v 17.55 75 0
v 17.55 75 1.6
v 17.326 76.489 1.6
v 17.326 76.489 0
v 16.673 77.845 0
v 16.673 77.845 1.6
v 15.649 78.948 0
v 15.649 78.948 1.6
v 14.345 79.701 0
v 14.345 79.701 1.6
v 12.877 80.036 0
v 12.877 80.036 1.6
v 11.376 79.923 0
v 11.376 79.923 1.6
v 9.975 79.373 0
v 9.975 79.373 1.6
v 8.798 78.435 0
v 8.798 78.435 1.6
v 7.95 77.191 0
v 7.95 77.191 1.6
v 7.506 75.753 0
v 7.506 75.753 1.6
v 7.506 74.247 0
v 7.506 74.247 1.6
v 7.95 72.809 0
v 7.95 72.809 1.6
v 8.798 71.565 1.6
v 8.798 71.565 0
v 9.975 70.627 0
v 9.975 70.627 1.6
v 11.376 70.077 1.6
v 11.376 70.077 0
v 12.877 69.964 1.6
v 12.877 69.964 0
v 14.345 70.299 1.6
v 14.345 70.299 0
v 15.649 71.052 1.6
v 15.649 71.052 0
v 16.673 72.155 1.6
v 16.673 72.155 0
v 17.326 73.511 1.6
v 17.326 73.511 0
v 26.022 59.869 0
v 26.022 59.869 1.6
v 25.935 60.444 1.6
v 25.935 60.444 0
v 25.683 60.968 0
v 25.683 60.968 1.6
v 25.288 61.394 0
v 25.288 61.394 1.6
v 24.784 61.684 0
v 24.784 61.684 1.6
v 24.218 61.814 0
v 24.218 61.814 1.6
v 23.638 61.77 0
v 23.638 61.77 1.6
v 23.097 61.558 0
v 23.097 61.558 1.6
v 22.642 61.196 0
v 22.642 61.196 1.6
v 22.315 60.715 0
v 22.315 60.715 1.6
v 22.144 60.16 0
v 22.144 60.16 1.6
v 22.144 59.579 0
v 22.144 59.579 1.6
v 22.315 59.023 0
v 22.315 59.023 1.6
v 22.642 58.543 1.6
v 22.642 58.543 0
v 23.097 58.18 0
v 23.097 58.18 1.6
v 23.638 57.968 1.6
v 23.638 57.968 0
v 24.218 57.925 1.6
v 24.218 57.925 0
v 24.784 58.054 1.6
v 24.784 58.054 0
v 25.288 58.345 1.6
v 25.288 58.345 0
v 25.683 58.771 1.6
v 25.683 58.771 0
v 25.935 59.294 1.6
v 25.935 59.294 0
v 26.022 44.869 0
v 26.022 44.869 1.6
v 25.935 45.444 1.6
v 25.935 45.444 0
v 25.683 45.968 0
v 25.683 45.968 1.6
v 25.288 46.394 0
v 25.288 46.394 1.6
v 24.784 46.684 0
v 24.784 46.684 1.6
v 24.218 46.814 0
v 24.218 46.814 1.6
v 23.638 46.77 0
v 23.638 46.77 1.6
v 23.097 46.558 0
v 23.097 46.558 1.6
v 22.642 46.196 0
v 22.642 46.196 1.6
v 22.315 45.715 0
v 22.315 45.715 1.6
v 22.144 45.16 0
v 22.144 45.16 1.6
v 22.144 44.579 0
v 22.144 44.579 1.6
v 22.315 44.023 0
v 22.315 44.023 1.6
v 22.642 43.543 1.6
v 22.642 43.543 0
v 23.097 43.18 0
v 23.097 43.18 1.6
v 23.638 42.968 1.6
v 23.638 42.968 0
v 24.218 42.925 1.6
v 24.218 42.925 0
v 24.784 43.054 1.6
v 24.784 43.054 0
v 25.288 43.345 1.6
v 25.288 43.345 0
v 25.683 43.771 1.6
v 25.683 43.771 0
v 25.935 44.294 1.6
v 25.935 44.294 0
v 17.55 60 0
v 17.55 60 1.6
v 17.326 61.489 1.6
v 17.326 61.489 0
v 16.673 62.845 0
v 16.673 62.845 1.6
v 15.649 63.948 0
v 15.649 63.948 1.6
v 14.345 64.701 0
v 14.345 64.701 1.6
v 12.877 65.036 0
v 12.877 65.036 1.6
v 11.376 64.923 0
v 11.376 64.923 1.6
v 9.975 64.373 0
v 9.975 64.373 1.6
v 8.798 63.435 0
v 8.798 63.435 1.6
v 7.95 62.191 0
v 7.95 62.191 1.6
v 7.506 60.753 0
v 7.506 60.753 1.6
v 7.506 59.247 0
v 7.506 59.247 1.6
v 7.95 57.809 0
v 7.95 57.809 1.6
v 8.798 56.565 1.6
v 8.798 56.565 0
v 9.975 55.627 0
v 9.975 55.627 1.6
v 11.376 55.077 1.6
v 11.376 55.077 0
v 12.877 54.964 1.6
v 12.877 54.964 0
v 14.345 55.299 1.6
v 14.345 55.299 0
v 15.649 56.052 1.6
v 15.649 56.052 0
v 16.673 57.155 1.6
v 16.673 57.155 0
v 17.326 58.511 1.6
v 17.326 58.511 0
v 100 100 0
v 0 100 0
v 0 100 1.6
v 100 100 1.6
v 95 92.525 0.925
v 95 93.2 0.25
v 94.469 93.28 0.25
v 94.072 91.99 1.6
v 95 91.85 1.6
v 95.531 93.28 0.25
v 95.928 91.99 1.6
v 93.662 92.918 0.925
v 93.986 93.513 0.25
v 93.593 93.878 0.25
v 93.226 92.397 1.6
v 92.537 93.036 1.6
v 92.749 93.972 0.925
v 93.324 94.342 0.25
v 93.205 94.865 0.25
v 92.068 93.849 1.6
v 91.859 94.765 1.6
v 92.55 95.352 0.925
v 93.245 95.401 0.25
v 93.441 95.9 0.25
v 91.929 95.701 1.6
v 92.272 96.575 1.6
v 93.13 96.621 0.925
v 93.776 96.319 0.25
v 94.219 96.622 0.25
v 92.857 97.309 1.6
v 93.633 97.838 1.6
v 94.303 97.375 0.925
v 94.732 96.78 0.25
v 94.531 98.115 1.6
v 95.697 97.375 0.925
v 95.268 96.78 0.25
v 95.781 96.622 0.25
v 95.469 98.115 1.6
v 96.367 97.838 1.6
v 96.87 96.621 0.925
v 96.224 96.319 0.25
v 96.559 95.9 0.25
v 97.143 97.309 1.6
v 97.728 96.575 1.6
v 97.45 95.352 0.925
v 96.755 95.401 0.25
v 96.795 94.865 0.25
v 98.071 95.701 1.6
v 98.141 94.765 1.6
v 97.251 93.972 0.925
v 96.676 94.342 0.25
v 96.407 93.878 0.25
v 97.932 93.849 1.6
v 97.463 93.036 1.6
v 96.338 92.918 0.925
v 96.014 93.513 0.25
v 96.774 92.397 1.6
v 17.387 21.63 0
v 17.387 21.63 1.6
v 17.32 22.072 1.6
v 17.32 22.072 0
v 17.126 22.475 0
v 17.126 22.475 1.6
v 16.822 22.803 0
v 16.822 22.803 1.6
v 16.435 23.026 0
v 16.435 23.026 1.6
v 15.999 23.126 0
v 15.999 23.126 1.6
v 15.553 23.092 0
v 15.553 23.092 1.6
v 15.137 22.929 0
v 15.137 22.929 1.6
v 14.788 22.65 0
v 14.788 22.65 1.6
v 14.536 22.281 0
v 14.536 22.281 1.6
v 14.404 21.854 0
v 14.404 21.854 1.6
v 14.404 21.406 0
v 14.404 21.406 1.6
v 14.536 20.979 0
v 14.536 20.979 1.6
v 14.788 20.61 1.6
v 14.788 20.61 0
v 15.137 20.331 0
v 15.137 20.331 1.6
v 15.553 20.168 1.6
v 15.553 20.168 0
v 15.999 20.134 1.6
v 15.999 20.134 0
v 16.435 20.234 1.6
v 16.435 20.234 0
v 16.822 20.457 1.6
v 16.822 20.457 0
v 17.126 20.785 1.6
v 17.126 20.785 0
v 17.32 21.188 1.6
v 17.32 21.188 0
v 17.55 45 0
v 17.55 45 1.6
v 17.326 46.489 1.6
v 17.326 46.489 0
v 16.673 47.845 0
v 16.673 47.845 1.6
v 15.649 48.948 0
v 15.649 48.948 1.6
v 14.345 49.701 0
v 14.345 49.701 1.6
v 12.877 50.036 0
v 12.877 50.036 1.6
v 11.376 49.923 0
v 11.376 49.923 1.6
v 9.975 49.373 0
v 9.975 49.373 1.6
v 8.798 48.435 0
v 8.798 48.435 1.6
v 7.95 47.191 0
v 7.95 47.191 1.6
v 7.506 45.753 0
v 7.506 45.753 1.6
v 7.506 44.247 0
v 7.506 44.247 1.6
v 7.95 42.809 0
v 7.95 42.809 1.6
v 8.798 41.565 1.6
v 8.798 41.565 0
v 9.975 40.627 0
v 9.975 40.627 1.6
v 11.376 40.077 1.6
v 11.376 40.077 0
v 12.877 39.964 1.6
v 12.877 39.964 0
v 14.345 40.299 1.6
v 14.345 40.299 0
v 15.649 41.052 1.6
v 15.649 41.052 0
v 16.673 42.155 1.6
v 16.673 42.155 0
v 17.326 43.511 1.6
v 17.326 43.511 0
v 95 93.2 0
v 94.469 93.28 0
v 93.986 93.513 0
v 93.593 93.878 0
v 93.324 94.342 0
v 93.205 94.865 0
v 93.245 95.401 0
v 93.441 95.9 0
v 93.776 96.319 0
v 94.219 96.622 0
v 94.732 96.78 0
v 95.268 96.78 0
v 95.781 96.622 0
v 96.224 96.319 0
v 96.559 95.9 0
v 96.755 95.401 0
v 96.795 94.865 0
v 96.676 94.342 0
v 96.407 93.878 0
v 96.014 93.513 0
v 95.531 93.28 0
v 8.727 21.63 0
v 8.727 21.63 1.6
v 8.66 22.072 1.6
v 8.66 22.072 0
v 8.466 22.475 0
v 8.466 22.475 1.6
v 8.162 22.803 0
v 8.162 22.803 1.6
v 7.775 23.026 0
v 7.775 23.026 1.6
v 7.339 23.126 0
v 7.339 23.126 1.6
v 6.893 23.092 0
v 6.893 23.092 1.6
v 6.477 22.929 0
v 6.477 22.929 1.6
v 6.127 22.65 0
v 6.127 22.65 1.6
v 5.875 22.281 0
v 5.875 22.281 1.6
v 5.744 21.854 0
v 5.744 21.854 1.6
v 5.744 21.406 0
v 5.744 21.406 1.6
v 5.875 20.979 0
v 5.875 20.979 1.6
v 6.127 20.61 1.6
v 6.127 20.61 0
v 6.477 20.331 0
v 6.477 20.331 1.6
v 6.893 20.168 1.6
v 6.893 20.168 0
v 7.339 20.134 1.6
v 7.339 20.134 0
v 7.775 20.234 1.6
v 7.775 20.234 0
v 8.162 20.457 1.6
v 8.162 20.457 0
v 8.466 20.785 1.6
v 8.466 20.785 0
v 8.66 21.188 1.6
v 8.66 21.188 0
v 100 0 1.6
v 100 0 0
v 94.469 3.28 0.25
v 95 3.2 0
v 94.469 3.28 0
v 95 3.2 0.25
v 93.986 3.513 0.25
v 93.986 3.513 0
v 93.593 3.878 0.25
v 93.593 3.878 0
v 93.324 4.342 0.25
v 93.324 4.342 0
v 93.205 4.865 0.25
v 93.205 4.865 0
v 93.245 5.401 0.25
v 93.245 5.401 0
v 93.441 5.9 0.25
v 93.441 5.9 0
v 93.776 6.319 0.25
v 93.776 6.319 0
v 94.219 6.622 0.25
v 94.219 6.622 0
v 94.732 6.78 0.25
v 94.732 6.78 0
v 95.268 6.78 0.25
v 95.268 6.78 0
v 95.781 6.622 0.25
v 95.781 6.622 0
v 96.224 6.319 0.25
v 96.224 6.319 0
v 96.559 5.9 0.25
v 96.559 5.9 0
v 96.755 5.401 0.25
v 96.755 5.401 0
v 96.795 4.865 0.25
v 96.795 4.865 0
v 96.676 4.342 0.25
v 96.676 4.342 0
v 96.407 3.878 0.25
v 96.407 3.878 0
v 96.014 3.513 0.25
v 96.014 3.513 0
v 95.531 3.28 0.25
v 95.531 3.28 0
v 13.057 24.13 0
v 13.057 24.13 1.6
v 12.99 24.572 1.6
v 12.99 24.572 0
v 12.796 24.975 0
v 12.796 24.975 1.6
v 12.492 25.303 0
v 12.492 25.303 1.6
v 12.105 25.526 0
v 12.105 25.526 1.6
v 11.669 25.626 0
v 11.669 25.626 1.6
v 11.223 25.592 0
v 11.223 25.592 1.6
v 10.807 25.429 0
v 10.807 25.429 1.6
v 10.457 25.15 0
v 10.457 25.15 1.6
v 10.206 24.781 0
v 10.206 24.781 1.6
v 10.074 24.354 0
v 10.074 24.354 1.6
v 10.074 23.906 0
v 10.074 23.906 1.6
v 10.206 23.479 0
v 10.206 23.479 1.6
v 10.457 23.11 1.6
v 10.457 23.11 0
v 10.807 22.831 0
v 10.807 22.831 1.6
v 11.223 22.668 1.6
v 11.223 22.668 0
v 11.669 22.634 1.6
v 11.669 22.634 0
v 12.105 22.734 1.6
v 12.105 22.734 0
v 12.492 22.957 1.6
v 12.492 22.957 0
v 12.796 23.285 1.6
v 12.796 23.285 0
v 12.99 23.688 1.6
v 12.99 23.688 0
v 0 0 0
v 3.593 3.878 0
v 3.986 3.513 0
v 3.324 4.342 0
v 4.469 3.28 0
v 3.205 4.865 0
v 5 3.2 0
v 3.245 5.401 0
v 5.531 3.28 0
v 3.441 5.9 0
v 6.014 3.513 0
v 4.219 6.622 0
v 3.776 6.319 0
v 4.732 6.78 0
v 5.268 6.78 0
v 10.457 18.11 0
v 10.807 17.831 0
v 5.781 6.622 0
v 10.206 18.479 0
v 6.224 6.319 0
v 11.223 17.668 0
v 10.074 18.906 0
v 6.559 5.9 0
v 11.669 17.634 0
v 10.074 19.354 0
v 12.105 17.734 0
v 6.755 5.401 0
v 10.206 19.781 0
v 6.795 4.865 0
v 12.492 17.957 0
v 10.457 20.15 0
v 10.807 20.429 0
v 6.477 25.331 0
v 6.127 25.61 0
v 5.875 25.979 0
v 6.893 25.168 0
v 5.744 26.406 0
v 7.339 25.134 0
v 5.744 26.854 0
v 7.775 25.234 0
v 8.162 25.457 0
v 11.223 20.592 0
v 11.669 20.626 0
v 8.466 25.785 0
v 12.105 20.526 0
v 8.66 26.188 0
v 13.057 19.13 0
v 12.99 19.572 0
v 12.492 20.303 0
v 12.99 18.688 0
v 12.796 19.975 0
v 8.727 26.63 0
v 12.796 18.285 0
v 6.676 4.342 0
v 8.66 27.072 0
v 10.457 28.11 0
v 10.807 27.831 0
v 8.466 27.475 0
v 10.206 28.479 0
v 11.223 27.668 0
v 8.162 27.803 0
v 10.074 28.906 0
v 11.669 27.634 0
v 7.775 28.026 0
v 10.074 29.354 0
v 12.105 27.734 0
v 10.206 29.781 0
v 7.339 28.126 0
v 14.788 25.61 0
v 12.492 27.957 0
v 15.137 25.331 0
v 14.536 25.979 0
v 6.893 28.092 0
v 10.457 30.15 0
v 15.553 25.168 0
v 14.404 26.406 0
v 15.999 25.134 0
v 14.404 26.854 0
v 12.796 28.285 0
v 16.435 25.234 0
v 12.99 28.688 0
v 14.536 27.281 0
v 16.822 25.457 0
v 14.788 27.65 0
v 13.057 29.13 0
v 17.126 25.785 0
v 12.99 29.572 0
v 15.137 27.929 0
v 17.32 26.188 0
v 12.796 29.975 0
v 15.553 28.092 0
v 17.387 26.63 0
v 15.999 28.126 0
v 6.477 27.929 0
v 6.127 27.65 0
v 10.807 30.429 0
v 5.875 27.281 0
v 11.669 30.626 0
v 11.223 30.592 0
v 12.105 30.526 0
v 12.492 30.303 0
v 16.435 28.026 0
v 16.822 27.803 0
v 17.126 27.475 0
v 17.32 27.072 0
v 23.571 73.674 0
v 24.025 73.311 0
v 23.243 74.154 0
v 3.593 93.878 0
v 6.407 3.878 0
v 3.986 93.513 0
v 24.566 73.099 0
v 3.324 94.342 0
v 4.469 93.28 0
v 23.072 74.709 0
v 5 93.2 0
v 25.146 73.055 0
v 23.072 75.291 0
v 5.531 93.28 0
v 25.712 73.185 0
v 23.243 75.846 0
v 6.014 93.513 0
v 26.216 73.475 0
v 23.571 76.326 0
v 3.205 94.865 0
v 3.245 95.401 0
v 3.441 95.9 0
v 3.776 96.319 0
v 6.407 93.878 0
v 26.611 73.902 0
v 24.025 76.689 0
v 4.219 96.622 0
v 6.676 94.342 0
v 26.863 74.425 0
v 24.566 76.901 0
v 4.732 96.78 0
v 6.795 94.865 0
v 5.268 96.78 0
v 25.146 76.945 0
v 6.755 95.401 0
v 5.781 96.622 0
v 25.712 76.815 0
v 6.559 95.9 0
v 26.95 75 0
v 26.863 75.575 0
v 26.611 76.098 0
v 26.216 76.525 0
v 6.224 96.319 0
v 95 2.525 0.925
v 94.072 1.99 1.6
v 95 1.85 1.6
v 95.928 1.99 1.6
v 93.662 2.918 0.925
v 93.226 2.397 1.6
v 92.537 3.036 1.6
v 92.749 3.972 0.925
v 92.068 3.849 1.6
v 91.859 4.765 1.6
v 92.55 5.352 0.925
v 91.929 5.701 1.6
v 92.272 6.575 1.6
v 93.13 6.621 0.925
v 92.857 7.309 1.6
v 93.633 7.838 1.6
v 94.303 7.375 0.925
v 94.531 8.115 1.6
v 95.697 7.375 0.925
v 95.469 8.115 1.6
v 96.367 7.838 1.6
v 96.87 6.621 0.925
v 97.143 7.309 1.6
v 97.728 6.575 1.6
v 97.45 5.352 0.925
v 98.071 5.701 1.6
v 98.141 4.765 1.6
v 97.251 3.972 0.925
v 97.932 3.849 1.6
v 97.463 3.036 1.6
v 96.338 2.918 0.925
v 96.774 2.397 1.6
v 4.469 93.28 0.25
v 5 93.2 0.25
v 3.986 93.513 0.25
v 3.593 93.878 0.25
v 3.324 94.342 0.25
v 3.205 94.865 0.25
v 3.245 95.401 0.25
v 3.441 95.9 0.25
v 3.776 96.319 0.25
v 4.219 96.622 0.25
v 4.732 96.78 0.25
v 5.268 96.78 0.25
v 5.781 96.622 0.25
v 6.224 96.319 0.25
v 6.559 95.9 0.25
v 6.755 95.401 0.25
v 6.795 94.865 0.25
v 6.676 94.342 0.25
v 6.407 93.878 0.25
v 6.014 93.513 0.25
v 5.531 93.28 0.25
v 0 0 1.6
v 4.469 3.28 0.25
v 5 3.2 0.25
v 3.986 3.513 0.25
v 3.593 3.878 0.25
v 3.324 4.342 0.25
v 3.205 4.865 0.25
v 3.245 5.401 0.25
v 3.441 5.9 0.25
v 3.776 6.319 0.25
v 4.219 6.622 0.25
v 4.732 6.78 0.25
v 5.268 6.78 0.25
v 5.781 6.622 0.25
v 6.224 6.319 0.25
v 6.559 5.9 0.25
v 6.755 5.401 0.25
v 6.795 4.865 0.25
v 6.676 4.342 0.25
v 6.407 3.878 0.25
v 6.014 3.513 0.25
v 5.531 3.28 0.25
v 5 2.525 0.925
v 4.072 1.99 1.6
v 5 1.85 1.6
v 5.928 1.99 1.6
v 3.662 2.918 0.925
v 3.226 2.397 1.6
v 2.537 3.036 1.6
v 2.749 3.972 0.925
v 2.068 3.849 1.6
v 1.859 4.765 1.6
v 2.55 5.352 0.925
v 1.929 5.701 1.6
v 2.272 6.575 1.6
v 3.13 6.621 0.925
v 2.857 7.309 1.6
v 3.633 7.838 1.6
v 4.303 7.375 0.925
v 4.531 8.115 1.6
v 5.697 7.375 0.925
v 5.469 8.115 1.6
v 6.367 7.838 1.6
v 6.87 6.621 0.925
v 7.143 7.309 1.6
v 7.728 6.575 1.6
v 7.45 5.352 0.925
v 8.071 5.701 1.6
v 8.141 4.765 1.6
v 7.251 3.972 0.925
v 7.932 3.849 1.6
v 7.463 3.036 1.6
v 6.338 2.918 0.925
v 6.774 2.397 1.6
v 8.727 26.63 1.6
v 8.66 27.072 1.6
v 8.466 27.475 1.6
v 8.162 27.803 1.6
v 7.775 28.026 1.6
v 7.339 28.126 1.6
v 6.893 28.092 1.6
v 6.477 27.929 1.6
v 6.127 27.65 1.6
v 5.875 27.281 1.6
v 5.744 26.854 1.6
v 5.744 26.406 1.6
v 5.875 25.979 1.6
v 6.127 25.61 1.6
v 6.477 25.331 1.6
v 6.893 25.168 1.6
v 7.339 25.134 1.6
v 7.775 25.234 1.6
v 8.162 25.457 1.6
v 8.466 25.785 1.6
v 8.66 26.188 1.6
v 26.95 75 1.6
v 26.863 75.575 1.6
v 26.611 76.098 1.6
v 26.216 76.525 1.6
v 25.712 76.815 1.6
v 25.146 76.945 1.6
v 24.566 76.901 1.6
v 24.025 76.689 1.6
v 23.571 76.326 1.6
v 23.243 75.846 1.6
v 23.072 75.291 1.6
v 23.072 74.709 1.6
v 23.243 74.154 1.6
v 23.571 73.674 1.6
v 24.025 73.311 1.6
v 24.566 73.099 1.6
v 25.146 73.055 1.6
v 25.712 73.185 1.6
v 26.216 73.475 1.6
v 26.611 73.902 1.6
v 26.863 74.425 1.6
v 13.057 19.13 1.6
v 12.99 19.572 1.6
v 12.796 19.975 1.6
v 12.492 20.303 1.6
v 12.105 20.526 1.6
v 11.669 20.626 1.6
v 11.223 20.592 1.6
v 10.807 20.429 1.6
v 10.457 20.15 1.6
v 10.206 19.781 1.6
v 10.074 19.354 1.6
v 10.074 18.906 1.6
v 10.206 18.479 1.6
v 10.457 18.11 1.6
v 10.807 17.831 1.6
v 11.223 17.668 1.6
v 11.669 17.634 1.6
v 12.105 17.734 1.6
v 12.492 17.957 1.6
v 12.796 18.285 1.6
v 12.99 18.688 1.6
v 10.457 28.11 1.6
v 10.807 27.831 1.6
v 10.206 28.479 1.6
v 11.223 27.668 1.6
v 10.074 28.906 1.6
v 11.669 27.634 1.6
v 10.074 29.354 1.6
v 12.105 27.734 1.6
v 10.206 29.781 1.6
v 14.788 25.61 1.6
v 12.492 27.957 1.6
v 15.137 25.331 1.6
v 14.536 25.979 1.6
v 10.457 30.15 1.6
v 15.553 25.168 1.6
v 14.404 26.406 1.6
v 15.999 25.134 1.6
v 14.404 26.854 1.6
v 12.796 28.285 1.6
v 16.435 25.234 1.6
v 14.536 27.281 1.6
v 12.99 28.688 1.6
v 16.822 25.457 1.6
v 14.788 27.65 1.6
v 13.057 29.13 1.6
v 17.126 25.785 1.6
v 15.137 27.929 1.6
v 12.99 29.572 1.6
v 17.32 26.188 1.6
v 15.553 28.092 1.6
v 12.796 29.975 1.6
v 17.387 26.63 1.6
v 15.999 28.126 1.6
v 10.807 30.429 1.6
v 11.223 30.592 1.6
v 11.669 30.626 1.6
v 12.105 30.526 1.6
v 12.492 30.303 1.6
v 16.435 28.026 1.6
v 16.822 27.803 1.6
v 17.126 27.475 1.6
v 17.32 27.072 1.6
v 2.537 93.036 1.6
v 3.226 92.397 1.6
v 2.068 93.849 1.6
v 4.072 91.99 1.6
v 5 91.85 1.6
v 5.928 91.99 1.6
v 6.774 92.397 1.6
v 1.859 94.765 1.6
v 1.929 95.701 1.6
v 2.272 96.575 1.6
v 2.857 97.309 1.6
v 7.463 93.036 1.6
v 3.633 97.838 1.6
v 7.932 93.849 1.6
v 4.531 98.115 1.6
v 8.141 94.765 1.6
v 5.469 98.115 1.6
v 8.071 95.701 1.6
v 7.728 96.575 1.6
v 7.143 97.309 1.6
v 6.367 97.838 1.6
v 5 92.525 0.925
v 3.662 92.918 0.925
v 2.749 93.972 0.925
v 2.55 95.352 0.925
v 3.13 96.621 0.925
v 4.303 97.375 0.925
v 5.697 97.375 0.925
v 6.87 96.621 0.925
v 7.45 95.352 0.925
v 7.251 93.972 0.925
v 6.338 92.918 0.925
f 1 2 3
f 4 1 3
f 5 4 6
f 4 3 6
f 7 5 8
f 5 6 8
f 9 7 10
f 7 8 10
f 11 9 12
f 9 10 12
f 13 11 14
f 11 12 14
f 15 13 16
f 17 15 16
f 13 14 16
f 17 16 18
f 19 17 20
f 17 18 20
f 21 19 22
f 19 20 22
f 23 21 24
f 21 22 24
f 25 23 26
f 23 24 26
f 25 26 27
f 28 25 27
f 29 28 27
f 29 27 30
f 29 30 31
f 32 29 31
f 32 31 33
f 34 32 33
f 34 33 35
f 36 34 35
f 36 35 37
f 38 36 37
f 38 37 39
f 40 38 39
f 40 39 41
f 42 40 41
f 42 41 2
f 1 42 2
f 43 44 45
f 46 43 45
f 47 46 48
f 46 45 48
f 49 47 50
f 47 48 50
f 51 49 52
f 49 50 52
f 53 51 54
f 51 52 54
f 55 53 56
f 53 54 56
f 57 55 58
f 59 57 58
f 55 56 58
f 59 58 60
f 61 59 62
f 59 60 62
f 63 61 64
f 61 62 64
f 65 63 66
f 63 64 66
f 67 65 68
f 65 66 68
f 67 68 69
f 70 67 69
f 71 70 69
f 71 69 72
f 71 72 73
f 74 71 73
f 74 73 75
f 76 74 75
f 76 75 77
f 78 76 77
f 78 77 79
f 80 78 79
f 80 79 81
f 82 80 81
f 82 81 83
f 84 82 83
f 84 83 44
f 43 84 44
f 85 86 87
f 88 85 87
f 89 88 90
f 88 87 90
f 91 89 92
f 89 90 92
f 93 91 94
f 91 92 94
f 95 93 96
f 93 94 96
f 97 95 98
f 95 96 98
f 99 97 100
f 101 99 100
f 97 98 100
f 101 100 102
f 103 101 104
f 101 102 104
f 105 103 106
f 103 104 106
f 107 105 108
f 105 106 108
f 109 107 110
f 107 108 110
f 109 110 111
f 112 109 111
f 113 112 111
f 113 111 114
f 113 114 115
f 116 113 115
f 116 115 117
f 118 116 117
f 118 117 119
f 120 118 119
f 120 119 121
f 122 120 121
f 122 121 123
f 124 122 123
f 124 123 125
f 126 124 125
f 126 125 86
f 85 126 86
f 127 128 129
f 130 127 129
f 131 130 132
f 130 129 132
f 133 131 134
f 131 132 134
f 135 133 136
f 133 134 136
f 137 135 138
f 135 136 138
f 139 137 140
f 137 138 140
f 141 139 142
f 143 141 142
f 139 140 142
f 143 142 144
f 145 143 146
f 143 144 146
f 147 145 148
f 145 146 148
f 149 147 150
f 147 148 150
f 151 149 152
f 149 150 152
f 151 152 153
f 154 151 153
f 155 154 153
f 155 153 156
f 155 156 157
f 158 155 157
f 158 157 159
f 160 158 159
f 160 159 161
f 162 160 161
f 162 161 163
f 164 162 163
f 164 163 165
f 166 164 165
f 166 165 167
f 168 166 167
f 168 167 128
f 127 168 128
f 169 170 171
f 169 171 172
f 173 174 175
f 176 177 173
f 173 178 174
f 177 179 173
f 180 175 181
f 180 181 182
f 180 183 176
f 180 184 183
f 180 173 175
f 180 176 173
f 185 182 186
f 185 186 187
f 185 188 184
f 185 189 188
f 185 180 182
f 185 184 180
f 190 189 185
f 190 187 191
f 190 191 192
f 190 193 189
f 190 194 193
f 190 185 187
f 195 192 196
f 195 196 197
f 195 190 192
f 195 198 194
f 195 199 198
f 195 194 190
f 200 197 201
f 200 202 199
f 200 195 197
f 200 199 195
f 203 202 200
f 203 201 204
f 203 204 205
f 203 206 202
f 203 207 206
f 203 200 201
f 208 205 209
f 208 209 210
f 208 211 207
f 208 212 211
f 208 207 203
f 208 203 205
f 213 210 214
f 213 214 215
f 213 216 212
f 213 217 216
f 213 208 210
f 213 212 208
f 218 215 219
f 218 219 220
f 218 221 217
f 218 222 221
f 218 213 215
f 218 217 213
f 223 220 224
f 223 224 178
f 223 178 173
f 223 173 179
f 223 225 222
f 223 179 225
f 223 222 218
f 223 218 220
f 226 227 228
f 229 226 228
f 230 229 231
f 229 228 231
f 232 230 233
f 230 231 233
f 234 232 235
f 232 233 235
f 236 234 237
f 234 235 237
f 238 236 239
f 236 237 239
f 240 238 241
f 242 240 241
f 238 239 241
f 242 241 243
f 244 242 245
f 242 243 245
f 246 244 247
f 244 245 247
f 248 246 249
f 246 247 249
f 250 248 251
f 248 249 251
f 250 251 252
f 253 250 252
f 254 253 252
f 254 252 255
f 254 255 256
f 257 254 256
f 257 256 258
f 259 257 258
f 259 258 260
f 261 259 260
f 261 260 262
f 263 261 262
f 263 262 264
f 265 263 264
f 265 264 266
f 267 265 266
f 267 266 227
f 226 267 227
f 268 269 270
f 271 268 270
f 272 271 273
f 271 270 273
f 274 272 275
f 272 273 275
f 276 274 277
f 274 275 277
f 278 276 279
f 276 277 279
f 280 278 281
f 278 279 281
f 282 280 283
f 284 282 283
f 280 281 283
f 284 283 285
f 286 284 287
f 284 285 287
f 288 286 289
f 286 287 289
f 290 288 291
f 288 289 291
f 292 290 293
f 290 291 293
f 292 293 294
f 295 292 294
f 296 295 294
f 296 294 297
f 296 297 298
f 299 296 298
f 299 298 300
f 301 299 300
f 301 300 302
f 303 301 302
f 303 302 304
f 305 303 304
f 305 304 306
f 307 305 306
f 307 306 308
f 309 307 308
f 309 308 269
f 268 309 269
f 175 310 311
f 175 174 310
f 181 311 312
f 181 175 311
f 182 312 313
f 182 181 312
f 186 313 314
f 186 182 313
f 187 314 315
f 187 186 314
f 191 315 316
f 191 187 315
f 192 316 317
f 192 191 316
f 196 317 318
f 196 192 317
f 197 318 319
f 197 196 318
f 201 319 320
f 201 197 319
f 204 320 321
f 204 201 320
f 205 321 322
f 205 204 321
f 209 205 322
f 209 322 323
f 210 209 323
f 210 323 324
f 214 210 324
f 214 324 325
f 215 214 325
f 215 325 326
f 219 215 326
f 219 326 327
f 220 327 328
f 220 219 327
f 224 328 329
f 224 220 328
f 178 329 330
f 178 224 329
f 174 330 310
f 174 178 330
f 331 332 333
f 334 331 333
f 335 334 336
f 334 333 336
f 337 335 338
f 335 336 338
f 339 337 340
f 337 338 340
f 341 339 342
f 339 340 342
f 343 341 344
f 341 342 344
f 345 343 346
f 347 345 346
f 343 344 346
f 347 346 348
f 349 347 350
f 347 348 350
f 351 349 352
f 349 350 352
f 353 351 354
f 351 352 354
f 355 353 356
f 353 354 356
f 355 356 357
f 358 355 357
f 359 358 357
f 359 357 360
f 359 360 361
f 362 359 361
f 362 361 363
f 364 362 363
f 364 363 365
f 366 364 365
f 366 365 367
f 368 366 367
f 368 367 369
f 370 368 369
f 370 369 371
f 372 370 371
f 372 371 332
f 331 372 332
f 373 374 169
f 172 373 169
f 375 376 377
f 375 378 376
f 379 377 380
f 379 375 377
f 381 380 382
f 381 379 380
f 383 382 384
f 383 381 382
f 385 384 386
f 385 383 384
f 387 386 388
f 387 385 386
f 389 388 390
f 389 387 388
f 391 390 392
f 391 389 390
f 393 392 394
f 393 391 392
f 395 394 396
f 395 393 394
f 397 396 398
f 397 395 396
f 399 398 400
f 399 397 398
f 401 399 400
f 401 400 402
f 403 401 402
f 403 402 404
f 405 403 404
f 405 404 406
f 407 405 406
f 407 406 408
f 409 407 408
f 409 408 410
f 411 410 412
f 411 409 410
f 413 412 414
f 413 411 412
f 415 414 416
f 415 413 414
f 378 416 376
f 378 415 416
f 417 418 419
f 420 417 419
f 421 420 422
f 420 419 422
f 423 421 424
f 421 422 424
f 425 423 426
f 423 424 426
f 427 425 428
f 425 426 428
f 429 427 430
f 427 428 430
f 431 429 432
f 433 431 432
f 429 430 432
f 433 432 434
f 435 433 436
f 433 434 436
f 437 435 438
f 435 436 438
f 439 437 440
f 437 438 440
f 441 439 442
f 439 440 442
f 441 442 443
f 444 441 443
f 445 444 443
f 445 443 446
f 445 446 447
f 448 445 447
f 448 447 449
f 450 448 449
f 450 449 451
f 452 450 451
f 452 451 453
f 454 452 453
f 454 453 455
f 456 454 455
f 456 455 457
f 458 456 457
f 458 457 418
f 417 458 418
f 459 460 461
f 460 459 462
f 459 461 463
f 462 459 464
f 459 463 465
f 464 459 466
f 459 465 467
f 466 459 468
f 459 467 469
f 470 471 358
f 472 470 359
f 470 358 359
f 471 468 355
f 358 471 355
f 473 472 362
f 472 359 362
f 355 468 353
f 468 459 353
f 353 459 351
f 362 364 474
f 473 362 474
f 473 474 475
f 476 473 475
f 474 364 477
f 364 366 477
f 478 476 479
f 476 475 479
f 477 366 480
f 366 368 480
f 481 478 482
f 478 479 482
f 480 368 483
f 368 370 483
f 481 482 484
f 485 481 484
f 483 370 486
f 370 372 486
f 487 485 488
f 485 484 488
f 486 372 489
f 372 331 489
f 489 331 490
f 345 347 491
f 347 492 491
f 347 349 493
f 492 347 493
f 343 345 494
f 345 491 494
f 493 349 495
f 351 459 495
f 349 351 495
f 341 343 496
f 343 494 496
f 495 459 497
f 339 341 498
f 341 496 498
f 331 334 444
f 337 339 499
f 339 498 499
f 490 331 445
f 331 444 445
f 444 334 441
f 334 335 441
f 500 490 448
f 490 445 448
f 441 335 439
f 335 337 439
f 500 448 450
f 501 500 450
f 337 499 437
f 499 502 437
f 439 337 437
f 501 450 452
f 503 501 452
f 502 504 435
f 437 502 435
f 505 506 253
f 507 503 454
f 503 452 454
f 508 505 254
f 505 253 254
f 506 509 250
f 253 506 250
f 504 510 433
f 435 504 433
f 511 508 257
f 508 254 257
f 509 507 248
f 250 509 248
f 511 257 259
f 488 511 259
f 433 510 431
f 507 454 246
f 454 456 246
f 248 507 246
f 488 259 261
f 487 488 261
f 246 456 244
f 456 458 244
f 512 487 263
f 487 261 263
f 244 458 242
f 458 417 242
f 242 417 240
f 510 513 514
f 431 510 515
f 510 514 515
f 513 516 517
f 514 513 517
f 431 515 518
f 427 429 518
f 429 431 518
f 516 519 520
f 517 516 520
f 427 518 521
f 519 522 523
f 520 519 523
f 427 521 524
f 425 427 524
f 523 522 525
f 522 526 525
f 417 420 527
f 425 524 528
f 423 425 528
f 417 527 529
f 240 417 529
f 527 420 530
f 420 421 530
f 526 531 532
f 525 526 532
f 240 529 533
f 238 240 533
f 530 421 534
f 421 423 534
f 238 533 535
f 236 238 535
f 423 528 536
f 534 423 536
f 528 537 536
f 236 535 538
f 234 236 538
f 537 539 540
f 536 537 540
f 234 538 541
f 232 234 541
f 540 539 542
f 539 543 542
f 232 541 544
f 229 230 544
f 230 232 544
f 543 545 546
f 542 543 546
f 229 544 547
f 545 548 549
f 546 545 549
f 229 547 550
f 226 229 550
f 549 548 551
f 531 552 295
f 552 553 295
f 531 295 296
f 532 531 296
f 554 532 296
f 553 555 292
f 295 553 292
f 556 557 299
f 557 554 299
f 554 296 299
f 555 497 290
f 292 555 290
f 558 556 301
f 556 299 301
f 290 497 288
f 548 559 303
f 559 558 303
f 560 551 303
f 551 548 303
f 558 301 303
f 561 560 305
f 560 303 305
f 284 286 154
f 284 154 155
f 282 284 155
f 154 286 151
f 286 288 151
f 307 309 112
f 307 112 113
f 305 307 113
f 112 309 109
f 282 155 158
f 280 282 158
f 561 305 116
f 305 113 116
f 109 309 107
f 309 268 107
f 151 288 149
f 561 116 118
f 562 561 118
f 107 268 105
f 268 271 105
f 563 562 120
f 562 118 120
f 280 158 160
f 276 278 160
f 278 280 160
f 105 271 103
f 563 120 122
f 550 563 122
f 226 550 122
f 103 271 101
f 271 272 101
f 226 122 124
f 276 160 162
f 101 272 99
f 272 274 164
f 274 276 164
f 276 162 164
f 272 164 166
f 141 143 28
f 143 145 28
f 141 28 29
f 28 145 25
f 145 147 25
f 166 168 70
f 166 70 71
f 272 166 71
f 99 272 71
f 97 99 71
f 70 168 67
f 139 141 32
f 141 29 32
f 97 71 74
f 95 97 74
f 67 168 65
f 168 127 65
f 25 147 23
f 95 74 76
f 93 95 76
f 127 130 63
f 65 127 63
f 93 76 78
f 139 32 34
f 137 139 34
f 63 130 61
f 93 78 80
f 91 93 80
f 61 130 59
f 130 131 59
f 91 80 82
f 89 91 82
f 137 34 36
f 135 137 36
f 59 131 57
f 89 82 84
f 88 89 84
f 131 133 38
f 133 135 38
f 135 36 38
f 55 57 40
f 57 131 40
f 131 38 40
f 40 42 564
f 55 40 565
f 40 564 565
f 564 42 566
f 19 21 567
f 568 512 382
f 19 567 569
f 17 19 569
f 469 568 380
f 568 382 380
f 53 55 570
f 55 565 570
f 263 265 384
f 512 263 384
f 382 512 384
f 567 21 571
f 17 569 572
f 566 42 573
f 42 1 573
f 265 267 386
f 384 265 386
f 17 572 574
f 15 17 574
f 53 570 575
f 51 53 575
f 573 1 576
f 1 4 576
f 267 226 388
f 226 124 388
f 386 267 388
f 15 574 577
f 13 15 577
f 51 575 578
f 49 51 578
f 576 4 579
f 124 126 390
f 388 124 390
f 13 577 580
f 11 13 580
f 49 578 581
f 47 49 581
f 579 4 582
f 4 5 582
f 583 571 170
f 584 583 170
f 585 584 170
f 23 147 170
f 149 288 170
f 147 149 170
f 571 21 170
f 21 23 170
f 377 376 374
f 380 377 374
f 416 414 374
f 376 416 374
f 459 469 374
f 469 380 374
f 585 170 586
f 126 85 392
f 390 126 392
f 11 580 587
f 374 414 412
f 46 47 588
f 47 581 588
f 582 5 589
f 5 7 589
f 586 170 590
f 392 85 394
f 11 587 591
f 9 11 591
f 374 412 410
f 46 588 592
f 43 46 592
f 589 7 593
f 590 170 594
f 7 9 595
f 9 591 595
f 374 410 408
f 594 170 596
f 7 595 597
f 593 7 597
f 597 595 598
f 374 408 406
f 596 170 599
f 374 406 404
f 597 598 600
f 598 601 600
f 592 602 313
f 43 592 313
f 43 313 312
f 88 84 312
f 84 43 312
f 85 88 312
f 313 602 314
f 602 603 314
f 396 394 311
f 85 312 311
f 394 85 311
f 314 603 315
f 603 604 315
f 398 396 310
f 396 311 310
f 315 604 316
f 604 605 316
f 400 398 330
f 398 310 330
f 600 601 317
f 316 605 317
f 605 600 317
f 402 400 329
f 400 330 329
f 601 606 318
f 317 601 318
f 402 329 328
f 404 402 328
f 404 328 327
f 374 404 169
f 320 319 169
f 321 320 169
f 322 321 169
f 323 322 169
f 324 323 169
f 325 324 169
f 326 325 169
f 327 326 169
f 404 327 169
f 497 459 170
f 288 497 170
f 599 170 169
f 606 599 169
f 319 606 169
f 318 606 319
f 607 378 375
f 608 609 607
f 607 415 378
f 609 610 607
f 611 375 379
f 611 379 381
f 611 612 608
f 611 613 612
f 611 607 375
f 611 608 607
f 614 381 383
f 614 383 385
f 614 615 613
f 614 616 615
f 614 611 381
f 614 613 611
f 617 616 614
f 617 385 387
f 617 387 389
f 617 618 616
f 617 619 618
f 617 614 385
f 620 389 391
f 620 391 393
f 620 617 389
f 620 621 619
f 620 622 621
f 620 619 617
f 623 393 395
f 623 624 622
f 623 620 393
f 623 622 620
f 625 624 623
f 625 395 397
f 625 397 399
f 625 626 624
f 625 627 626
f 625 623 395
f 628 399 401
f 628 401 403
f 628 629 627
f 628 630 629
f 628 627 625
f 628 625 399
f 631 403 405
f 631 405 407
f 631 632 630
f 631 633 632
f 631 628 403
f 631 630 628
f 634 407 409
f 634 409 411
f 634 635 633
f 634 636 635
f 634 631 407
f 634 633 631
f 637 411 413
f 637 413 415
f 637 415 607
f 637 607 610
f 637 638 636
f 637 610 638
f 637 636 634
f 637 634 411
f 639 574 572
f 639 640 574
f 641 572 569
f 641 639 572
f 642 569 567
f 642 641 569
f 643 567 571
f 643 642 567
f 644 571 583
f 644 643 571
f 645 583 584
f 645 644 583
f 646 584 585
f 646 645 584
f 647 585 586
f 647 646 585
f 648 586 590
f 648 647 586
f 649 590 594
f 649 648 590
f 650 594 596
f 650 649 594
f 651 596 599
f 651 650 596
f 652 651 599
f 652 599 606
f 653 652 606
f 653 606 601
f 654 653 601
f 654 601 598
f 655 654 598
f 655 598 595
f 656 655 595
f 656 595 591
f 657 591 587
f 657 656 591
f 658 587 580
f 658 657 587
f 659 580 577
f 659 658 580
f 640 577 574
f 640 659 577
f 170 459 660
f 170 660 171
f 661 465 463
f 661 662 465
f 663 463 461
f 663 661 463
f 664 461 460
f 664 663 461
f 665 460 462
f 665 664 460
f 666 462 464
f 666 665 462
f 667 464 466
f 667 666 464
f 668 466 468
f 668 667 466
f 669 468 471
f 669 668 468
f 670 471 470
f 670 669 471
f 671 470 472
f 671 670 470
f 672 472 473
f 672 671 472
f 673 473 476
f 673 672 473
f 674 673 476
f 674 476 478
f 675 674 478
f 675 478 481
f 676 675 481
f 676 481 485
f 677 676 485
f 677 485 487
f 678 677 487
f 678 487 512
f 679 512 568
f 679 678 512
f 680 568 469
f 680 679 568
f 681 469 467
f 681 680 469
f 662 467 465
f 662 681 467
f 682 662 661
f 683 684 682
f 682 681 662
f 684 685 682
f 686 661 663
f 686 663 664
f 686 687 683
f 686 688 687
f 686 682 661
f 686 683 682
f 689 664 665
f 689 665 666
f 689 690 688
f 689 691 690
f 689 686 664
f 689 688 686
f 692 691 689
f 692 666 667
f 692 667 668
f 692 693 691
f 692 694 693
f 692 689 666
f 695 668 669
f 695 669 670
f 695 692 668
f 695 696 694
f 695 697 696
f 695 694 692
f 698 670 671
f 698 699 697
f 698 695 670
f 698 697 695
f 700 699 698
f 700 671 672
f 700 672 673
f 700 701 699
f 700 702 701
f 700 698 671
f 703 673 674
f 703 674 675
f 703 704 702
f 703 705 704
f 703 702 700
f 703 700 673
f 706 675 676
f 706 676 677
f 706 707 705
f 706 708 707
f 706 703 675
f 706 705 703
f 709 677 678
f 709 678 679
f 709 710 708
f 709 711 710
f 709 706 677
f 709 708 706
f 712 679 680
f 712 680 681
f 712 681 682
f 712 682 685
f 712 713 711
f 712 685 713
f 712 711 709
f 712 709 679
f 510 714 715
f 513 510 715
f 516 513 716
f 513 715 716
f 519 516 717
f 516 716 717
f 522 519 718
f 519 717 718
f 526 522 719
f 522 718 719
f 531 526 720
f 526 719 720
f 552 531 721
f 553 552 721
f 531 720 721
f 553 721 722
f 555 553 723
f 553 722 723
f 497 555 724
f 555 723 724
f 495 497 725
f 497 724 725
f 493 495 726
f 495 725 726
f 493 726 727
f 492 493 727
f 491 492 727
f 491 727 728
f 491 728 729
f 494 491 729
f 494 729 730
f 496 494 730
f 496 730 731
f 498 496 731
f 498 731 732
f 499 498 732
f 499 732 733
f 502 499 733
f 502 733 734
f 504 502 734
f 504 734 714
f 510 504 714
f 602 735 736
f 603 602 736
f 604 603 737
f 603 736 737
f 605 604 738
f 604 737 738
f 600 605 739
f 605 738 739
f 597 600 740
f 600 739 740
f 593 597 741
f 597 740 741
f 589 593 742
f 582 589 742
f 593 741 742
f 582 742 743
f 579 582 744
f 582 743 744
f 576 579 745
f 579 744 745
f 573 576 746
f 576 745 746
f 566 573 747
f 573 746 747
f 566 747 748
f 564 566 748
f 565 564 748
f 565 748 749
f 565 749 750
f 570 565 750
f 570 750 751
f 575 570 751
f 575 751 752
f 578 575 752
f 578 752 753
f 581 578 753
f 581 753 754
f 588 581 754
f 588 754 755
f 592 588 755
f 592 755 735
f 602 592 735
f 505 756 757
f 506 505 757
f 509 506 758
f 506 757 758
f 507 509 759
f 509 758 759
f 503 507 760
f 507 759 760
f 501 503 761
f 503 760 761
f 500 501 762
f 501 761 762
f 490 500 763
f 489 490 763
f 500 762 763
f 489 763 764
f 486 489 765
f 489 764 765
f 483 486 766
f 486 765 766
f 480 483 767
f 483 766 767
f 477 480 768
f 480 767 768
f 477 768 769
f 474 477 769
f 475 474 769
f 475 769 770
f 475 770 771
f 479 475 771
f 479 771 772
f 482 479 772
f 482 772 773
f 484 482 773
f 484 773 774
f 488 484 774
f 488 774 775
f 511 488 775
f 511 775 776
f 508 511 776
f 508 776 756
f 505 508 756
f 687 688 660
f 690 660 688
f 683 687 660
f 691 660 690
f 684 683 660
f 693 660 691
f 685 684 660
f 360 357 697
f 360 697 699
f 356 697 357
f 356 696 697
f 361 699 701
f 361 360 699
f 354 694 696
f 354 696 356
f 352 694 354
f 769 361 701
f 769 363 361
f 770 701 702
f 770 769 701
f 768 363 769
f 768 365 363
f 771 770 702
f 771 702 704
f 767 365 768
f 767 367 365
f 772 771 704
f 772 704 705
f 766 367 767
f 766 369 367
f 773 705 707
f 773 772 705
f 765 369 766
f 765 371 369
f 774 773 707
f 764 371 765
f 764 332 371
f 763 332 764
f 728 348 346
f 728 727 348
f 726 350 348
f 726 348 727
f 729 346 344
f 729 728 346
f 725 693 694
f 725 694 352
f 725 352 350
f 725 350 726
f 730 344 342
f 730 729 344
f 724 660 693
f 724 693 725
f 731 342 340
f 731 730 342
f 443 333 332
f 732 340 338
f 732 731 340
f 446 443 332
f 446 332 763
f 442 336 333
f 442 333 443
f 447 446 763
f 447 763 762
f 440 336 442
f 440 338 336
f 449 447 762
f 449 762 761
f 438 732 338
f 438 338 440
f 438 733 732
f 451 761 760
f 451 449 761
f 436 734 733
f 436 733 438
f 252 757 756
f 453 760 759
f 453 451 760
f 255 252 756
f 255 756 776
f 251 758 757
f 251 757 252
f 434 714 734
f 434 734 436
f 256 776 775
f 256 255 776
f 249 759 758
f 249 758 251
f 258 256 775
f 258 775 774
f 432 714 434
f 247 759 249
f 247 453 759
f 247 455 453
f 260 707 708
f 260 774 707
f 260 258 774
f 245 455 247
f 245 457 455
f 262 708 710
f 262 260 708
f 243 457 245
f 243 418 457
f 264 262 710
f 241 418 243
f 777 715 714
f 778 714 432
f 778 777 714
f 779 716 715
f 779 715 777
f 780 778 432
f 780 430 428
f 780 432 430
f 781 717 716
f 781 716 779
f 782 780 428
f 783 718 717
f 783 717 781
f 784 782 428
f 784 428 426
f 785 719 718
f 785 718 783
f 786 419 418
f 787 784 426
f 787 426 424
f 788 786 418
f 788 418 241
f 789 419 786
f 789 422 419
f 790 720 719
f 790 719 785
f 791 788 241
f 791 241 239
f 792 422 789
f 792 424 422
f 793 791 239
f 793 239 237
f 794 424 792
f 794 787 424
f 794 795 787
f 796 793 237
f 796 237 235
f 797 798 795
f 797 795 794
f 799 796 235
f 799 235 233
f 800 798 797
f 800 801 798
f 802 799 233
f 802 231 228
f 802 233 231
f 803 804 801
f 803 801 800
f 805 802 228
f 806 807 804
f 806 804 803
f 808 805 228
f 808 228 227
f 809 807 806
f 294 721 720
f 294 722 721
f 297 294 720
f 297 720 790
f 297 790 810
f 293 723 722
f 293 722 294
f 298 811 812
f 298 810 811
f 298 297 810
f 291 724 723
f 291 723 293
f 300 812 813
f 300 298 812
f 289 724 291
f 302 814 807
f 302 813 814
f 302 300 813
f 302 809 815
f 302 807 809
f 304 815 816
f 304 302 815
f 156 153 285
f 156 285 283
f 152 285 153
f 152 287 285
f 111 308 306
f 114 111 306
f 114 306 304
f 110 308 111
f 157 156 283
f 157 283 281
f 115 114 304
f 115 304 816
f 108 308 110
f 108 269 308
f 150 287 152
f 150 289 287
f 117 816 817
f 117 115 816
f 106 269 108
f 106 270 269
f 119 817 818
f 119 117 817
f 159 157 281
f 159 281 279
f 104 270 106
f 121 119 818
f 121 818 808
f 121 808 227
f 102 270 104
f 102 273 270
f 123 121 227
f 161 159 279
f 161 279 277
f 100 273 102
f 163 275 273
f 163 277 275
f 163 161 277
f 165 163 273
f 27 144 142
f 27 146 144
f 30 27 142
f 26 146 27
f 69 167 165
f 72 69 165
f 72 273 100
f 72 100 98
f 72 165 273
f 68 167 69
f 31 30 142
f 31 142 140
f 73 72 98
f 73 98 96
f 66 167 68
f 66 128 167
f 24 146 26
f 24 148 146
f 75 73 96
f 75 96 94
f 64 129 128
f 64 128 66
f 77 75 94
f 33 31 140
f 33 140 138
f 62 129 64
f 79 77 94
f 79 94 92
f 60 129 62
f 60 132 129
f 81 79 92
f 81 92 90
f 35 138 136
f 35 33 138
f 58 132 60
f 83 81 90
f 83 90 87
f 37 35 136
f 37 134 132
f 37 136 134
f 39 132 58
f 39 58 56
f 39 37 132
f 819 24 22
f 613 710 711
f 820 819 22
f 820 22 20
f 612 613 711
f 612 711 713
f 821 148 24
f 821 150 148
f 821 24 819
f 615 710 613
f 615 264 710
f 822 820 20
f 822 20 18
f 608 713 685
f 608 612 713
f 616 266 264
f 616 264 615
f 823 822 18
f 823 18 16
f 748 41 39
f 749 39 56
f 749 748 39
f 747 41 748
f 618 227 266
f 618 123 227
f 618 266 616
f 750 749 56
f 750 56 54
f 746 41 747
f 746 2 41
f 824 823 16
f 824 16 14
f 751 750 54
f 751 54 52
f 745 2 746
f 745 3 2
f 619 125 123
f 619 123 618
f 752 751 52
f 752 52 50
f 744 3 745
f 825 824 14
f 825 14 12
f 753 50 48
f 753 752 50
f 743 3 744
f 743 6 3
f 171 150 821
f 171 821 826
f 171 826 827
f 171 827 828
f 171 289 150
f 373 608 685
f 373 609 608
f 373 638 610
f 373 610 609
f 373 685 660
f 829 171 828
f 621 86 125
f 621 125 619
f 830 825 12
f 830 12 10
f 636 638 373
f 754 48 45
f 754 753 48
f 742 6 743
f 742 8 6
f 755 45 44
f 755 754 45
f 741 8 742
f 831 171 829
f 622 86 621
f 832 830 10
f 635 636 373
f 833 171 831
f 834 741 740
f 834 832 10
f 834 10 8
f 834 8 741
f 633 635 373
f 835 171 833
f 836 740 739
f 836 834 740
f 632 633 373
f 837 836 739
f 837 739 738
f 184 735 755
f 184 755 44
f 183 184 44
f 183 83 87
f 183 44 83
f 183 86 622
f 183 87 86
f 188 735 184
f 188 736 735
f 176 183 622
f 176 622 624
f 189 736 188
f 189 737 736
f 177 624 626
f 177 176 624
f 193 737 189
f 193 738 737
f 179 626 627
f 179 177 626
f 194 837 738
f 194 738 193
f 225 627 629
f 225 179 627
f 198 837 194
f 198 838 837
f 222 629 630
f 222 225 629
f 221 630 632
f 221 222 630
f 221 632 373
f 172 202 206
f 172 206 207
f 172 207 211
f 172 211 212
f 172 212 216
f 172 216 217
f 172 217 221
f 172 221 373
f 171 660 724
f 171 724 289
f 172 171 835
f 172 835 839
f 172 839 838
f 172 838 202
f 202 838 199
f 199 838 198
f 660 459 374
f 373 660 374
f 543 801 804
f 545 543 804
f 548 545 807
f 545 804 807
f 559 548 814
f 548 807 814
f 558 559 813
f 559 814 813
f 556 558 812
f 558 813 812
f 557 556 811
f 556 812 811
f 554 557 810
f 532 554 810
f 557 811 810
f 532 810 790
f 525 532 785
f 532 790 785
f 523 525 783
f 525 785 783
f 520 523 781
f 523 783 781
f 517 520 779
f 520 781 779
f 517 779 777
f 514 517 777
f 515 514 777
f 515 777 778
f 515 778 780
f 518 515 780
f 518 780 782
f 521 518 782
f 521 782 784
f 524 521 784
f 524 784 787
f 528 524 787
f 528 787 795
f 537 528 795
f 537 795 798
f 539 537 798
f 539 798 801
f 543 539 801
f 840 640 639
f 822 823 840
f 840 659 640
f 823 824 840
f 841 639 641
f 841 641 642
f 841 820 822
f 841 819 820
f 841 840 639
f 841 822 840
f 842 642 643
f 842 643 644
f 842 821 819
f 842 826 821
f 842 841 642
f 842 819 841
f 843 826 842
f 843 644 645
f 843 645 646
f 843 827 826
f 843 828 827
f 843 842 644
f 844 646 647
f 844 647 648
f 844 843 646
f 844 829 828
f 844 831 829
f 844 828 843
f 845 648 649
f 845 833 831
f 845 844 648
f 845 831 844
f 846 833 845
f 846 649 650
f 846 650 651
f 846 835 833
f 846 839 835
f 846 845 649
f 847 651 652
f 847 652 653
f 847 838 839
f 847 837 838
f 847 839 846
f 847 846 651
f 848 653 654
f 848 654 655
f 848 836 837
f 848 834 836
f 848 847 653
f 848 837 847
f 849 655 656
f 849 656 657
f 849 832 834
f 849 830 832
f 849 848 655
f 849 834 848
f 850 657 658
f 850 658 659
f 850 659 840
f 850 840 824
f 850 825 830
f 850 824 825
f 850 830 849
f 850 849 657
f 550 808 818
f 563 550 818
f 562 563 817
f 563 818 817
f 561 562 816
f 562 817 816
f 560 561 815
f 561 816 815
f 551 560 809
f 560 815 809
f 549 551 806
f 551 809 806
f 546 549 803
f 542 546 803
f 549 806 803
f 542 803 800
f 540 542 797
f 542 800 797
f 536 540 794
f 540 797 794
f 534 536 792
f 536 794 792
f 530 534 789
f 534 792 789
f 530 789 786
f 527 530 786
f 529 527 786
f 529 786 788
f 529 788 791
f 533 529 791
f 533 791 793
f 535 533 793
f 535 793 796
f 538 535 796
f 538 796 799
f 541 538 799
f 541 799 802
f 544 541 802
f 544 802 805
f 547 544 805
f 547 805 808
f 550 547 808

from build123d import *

# Parameters (mm, degrees)
ESQUISSE1_W                                 = 100
ESQUISSE1_H                                 = 100
BOSS_EXTRU_1_DEPTH                          = 1.6
FRAISAGE_POUR_VIS_T_TE_FRAIS_E_M31_AT_COUNT = 2
FRAISAGE_POUR_VIS_T_TE_FRAIS_E_M31_AT_PITCH = 90
FRAISAGE_POUR_VIS_T_TE_FRAIS_E_M31_2_COUNT  = 2
FRAISAGE_POUR_VIS_T_TE_FRAIS_E_M31_2_PITCH  = 127.279220614
FRAISAGE_POUR_VIS_T_TE_FRAIS_E_M31_3_COUNT  = 2
FRAISAGE_POUR_VIS_T_TE_FRAIS_E_M31_3_PITCH  = 90
ESQUISSE4_R                                 = 1.5
ESQUISSE4_R_2                               = 5.05
ESQUISSE4_R_3                               = 1.95
ENL_V_MAT_EXTRU_1_DEPTH                     = 2.6


with BuildPart() as part:
    # Esquisse1 → Boss.-Extru.1 (new body)
    with BuildSketch(Plane.XY):
        with Locations((50, 50)):
            Rectangle(ESQUISSE1_W, ESQUISSE1_H)
    extrude(amount=BOSS_EXTRU_1_DEPTH)

    # Esquisse3 → Fraisage pour vis à tête fraisée M31 (revolve, cut)
    with BuildSketch(Plane(origin=(5, 95, 1.6), x_dir=(0, -1, 0), z_dir=(1, 0, 0))):
        Polygon((0, 0), (0, 1.6), (1.8, 1.6), (1.8, 1.35), (3.15, 0), align=None)
    fraisage_pour_vis_t_te_frais_e_m31 = revolve(axis=Axis((5, 95, 7.95), (0, 0, -1)), mode=Mode.SUBTRACT)

    # Fraisage pour vis à tête fraisée M31 at: Fraisage pour vis à tête fraisée M31 ×2
    with Locations(*[(i * FRAISAGE_POUR_VIS_T_TE_FRAIS_E_M31_AT_PITCH, 0, 0) for i in range(1, FRAISAGE_POUR_VIS_T_TE_FRAIS_E_M31_AT_COUNT)]):
        add(fraisage_pour_vis_t_te_frais_e_m31, mode=Mode.SUBTRACT)

    # Fraisage pour vis _ t_te frais_e M31 2: Fraisage pour vis à tête fraisée M31 ×2
    with Locations(*[Vector(0.707106781, -0.707106781, 0) * (i * FRAISAGE_POUR_VIS_T_TE_FRAIS_E_M31_2_PITCH) for i in range(1, FRAISAGE_POUR_VIS_T_TE_FRAIS_E_M31_2_COUNT)]):
        add(fraisage_pour_vis_t_te_frais_e_m31, mode=Mode.SUBTRACT)

    # Fraisage pour vis _ t_te frais_e M31 3: Fraisage pour vis à tête fraisée M31 ×2
    with Locations(*[(0, -i * FRAISAGE_POUR_VIS_T_TE_FRAIS_E_M31_3_PITCH, 0) for i in range(1, FRAISAGE_POUR_VIS_T_TE_FRAIS_E_M31_3_COUNT)]):
        add(fraisage_pour_vis_t_te_frais_e_m31, mode=Mode.SUBTRACT)

    # Esquisse4 → Enlèv. mat.-Extru.1 (cut, through all)
    with BuildSketch(Plane.XY.offset(1.6)):
        with Locations((11.557, 24.13)):
            Circle(ESQUISSE4_R)
        with Locations((11.557, 29.13)):
            Circle(ESQUISSE4_R)
        with Locations((15.887127019, 26.63)):
            Circle(ESQUISSE4_R)
        with Locations((15.887127019, 21.63)):
            Circle(ESQUISSE4_R)
        with Locations((11.557, 19.13)):
            Circle(ESQUISSE4_R)
        with Locations((7.226872981, 21.63)):
            Circle(ESQUISSE4_R)
        with Locations((7.226872981, 26.63)):
            Circle(ESQUISSE4_R)
        with Locations((12.5, 75)):
            Circle(ESQUISSE4_R_2)
        with Locations((12.5, 60)):
            Circle(ESQUISSE4_R_2)
        with Locations((12.5, 45)):
            Circle(ESQUISSE4_R_2)
        with Locations((25, 75)):
            Circle(ESQUISSE4_R_3)
        with Locations((24.07180174, 59.869246014)):
            Circle(ESQUISSE4_R_3)
        with Locations((24.07180174, 44.869246014)):
            Circle(ESQUISSE4_R_3)
    extrude(amount=-ENL_V_MAT_EXTRU_1_DEPTH, mode=Mode.SUBTRACT)


solid = part.part
